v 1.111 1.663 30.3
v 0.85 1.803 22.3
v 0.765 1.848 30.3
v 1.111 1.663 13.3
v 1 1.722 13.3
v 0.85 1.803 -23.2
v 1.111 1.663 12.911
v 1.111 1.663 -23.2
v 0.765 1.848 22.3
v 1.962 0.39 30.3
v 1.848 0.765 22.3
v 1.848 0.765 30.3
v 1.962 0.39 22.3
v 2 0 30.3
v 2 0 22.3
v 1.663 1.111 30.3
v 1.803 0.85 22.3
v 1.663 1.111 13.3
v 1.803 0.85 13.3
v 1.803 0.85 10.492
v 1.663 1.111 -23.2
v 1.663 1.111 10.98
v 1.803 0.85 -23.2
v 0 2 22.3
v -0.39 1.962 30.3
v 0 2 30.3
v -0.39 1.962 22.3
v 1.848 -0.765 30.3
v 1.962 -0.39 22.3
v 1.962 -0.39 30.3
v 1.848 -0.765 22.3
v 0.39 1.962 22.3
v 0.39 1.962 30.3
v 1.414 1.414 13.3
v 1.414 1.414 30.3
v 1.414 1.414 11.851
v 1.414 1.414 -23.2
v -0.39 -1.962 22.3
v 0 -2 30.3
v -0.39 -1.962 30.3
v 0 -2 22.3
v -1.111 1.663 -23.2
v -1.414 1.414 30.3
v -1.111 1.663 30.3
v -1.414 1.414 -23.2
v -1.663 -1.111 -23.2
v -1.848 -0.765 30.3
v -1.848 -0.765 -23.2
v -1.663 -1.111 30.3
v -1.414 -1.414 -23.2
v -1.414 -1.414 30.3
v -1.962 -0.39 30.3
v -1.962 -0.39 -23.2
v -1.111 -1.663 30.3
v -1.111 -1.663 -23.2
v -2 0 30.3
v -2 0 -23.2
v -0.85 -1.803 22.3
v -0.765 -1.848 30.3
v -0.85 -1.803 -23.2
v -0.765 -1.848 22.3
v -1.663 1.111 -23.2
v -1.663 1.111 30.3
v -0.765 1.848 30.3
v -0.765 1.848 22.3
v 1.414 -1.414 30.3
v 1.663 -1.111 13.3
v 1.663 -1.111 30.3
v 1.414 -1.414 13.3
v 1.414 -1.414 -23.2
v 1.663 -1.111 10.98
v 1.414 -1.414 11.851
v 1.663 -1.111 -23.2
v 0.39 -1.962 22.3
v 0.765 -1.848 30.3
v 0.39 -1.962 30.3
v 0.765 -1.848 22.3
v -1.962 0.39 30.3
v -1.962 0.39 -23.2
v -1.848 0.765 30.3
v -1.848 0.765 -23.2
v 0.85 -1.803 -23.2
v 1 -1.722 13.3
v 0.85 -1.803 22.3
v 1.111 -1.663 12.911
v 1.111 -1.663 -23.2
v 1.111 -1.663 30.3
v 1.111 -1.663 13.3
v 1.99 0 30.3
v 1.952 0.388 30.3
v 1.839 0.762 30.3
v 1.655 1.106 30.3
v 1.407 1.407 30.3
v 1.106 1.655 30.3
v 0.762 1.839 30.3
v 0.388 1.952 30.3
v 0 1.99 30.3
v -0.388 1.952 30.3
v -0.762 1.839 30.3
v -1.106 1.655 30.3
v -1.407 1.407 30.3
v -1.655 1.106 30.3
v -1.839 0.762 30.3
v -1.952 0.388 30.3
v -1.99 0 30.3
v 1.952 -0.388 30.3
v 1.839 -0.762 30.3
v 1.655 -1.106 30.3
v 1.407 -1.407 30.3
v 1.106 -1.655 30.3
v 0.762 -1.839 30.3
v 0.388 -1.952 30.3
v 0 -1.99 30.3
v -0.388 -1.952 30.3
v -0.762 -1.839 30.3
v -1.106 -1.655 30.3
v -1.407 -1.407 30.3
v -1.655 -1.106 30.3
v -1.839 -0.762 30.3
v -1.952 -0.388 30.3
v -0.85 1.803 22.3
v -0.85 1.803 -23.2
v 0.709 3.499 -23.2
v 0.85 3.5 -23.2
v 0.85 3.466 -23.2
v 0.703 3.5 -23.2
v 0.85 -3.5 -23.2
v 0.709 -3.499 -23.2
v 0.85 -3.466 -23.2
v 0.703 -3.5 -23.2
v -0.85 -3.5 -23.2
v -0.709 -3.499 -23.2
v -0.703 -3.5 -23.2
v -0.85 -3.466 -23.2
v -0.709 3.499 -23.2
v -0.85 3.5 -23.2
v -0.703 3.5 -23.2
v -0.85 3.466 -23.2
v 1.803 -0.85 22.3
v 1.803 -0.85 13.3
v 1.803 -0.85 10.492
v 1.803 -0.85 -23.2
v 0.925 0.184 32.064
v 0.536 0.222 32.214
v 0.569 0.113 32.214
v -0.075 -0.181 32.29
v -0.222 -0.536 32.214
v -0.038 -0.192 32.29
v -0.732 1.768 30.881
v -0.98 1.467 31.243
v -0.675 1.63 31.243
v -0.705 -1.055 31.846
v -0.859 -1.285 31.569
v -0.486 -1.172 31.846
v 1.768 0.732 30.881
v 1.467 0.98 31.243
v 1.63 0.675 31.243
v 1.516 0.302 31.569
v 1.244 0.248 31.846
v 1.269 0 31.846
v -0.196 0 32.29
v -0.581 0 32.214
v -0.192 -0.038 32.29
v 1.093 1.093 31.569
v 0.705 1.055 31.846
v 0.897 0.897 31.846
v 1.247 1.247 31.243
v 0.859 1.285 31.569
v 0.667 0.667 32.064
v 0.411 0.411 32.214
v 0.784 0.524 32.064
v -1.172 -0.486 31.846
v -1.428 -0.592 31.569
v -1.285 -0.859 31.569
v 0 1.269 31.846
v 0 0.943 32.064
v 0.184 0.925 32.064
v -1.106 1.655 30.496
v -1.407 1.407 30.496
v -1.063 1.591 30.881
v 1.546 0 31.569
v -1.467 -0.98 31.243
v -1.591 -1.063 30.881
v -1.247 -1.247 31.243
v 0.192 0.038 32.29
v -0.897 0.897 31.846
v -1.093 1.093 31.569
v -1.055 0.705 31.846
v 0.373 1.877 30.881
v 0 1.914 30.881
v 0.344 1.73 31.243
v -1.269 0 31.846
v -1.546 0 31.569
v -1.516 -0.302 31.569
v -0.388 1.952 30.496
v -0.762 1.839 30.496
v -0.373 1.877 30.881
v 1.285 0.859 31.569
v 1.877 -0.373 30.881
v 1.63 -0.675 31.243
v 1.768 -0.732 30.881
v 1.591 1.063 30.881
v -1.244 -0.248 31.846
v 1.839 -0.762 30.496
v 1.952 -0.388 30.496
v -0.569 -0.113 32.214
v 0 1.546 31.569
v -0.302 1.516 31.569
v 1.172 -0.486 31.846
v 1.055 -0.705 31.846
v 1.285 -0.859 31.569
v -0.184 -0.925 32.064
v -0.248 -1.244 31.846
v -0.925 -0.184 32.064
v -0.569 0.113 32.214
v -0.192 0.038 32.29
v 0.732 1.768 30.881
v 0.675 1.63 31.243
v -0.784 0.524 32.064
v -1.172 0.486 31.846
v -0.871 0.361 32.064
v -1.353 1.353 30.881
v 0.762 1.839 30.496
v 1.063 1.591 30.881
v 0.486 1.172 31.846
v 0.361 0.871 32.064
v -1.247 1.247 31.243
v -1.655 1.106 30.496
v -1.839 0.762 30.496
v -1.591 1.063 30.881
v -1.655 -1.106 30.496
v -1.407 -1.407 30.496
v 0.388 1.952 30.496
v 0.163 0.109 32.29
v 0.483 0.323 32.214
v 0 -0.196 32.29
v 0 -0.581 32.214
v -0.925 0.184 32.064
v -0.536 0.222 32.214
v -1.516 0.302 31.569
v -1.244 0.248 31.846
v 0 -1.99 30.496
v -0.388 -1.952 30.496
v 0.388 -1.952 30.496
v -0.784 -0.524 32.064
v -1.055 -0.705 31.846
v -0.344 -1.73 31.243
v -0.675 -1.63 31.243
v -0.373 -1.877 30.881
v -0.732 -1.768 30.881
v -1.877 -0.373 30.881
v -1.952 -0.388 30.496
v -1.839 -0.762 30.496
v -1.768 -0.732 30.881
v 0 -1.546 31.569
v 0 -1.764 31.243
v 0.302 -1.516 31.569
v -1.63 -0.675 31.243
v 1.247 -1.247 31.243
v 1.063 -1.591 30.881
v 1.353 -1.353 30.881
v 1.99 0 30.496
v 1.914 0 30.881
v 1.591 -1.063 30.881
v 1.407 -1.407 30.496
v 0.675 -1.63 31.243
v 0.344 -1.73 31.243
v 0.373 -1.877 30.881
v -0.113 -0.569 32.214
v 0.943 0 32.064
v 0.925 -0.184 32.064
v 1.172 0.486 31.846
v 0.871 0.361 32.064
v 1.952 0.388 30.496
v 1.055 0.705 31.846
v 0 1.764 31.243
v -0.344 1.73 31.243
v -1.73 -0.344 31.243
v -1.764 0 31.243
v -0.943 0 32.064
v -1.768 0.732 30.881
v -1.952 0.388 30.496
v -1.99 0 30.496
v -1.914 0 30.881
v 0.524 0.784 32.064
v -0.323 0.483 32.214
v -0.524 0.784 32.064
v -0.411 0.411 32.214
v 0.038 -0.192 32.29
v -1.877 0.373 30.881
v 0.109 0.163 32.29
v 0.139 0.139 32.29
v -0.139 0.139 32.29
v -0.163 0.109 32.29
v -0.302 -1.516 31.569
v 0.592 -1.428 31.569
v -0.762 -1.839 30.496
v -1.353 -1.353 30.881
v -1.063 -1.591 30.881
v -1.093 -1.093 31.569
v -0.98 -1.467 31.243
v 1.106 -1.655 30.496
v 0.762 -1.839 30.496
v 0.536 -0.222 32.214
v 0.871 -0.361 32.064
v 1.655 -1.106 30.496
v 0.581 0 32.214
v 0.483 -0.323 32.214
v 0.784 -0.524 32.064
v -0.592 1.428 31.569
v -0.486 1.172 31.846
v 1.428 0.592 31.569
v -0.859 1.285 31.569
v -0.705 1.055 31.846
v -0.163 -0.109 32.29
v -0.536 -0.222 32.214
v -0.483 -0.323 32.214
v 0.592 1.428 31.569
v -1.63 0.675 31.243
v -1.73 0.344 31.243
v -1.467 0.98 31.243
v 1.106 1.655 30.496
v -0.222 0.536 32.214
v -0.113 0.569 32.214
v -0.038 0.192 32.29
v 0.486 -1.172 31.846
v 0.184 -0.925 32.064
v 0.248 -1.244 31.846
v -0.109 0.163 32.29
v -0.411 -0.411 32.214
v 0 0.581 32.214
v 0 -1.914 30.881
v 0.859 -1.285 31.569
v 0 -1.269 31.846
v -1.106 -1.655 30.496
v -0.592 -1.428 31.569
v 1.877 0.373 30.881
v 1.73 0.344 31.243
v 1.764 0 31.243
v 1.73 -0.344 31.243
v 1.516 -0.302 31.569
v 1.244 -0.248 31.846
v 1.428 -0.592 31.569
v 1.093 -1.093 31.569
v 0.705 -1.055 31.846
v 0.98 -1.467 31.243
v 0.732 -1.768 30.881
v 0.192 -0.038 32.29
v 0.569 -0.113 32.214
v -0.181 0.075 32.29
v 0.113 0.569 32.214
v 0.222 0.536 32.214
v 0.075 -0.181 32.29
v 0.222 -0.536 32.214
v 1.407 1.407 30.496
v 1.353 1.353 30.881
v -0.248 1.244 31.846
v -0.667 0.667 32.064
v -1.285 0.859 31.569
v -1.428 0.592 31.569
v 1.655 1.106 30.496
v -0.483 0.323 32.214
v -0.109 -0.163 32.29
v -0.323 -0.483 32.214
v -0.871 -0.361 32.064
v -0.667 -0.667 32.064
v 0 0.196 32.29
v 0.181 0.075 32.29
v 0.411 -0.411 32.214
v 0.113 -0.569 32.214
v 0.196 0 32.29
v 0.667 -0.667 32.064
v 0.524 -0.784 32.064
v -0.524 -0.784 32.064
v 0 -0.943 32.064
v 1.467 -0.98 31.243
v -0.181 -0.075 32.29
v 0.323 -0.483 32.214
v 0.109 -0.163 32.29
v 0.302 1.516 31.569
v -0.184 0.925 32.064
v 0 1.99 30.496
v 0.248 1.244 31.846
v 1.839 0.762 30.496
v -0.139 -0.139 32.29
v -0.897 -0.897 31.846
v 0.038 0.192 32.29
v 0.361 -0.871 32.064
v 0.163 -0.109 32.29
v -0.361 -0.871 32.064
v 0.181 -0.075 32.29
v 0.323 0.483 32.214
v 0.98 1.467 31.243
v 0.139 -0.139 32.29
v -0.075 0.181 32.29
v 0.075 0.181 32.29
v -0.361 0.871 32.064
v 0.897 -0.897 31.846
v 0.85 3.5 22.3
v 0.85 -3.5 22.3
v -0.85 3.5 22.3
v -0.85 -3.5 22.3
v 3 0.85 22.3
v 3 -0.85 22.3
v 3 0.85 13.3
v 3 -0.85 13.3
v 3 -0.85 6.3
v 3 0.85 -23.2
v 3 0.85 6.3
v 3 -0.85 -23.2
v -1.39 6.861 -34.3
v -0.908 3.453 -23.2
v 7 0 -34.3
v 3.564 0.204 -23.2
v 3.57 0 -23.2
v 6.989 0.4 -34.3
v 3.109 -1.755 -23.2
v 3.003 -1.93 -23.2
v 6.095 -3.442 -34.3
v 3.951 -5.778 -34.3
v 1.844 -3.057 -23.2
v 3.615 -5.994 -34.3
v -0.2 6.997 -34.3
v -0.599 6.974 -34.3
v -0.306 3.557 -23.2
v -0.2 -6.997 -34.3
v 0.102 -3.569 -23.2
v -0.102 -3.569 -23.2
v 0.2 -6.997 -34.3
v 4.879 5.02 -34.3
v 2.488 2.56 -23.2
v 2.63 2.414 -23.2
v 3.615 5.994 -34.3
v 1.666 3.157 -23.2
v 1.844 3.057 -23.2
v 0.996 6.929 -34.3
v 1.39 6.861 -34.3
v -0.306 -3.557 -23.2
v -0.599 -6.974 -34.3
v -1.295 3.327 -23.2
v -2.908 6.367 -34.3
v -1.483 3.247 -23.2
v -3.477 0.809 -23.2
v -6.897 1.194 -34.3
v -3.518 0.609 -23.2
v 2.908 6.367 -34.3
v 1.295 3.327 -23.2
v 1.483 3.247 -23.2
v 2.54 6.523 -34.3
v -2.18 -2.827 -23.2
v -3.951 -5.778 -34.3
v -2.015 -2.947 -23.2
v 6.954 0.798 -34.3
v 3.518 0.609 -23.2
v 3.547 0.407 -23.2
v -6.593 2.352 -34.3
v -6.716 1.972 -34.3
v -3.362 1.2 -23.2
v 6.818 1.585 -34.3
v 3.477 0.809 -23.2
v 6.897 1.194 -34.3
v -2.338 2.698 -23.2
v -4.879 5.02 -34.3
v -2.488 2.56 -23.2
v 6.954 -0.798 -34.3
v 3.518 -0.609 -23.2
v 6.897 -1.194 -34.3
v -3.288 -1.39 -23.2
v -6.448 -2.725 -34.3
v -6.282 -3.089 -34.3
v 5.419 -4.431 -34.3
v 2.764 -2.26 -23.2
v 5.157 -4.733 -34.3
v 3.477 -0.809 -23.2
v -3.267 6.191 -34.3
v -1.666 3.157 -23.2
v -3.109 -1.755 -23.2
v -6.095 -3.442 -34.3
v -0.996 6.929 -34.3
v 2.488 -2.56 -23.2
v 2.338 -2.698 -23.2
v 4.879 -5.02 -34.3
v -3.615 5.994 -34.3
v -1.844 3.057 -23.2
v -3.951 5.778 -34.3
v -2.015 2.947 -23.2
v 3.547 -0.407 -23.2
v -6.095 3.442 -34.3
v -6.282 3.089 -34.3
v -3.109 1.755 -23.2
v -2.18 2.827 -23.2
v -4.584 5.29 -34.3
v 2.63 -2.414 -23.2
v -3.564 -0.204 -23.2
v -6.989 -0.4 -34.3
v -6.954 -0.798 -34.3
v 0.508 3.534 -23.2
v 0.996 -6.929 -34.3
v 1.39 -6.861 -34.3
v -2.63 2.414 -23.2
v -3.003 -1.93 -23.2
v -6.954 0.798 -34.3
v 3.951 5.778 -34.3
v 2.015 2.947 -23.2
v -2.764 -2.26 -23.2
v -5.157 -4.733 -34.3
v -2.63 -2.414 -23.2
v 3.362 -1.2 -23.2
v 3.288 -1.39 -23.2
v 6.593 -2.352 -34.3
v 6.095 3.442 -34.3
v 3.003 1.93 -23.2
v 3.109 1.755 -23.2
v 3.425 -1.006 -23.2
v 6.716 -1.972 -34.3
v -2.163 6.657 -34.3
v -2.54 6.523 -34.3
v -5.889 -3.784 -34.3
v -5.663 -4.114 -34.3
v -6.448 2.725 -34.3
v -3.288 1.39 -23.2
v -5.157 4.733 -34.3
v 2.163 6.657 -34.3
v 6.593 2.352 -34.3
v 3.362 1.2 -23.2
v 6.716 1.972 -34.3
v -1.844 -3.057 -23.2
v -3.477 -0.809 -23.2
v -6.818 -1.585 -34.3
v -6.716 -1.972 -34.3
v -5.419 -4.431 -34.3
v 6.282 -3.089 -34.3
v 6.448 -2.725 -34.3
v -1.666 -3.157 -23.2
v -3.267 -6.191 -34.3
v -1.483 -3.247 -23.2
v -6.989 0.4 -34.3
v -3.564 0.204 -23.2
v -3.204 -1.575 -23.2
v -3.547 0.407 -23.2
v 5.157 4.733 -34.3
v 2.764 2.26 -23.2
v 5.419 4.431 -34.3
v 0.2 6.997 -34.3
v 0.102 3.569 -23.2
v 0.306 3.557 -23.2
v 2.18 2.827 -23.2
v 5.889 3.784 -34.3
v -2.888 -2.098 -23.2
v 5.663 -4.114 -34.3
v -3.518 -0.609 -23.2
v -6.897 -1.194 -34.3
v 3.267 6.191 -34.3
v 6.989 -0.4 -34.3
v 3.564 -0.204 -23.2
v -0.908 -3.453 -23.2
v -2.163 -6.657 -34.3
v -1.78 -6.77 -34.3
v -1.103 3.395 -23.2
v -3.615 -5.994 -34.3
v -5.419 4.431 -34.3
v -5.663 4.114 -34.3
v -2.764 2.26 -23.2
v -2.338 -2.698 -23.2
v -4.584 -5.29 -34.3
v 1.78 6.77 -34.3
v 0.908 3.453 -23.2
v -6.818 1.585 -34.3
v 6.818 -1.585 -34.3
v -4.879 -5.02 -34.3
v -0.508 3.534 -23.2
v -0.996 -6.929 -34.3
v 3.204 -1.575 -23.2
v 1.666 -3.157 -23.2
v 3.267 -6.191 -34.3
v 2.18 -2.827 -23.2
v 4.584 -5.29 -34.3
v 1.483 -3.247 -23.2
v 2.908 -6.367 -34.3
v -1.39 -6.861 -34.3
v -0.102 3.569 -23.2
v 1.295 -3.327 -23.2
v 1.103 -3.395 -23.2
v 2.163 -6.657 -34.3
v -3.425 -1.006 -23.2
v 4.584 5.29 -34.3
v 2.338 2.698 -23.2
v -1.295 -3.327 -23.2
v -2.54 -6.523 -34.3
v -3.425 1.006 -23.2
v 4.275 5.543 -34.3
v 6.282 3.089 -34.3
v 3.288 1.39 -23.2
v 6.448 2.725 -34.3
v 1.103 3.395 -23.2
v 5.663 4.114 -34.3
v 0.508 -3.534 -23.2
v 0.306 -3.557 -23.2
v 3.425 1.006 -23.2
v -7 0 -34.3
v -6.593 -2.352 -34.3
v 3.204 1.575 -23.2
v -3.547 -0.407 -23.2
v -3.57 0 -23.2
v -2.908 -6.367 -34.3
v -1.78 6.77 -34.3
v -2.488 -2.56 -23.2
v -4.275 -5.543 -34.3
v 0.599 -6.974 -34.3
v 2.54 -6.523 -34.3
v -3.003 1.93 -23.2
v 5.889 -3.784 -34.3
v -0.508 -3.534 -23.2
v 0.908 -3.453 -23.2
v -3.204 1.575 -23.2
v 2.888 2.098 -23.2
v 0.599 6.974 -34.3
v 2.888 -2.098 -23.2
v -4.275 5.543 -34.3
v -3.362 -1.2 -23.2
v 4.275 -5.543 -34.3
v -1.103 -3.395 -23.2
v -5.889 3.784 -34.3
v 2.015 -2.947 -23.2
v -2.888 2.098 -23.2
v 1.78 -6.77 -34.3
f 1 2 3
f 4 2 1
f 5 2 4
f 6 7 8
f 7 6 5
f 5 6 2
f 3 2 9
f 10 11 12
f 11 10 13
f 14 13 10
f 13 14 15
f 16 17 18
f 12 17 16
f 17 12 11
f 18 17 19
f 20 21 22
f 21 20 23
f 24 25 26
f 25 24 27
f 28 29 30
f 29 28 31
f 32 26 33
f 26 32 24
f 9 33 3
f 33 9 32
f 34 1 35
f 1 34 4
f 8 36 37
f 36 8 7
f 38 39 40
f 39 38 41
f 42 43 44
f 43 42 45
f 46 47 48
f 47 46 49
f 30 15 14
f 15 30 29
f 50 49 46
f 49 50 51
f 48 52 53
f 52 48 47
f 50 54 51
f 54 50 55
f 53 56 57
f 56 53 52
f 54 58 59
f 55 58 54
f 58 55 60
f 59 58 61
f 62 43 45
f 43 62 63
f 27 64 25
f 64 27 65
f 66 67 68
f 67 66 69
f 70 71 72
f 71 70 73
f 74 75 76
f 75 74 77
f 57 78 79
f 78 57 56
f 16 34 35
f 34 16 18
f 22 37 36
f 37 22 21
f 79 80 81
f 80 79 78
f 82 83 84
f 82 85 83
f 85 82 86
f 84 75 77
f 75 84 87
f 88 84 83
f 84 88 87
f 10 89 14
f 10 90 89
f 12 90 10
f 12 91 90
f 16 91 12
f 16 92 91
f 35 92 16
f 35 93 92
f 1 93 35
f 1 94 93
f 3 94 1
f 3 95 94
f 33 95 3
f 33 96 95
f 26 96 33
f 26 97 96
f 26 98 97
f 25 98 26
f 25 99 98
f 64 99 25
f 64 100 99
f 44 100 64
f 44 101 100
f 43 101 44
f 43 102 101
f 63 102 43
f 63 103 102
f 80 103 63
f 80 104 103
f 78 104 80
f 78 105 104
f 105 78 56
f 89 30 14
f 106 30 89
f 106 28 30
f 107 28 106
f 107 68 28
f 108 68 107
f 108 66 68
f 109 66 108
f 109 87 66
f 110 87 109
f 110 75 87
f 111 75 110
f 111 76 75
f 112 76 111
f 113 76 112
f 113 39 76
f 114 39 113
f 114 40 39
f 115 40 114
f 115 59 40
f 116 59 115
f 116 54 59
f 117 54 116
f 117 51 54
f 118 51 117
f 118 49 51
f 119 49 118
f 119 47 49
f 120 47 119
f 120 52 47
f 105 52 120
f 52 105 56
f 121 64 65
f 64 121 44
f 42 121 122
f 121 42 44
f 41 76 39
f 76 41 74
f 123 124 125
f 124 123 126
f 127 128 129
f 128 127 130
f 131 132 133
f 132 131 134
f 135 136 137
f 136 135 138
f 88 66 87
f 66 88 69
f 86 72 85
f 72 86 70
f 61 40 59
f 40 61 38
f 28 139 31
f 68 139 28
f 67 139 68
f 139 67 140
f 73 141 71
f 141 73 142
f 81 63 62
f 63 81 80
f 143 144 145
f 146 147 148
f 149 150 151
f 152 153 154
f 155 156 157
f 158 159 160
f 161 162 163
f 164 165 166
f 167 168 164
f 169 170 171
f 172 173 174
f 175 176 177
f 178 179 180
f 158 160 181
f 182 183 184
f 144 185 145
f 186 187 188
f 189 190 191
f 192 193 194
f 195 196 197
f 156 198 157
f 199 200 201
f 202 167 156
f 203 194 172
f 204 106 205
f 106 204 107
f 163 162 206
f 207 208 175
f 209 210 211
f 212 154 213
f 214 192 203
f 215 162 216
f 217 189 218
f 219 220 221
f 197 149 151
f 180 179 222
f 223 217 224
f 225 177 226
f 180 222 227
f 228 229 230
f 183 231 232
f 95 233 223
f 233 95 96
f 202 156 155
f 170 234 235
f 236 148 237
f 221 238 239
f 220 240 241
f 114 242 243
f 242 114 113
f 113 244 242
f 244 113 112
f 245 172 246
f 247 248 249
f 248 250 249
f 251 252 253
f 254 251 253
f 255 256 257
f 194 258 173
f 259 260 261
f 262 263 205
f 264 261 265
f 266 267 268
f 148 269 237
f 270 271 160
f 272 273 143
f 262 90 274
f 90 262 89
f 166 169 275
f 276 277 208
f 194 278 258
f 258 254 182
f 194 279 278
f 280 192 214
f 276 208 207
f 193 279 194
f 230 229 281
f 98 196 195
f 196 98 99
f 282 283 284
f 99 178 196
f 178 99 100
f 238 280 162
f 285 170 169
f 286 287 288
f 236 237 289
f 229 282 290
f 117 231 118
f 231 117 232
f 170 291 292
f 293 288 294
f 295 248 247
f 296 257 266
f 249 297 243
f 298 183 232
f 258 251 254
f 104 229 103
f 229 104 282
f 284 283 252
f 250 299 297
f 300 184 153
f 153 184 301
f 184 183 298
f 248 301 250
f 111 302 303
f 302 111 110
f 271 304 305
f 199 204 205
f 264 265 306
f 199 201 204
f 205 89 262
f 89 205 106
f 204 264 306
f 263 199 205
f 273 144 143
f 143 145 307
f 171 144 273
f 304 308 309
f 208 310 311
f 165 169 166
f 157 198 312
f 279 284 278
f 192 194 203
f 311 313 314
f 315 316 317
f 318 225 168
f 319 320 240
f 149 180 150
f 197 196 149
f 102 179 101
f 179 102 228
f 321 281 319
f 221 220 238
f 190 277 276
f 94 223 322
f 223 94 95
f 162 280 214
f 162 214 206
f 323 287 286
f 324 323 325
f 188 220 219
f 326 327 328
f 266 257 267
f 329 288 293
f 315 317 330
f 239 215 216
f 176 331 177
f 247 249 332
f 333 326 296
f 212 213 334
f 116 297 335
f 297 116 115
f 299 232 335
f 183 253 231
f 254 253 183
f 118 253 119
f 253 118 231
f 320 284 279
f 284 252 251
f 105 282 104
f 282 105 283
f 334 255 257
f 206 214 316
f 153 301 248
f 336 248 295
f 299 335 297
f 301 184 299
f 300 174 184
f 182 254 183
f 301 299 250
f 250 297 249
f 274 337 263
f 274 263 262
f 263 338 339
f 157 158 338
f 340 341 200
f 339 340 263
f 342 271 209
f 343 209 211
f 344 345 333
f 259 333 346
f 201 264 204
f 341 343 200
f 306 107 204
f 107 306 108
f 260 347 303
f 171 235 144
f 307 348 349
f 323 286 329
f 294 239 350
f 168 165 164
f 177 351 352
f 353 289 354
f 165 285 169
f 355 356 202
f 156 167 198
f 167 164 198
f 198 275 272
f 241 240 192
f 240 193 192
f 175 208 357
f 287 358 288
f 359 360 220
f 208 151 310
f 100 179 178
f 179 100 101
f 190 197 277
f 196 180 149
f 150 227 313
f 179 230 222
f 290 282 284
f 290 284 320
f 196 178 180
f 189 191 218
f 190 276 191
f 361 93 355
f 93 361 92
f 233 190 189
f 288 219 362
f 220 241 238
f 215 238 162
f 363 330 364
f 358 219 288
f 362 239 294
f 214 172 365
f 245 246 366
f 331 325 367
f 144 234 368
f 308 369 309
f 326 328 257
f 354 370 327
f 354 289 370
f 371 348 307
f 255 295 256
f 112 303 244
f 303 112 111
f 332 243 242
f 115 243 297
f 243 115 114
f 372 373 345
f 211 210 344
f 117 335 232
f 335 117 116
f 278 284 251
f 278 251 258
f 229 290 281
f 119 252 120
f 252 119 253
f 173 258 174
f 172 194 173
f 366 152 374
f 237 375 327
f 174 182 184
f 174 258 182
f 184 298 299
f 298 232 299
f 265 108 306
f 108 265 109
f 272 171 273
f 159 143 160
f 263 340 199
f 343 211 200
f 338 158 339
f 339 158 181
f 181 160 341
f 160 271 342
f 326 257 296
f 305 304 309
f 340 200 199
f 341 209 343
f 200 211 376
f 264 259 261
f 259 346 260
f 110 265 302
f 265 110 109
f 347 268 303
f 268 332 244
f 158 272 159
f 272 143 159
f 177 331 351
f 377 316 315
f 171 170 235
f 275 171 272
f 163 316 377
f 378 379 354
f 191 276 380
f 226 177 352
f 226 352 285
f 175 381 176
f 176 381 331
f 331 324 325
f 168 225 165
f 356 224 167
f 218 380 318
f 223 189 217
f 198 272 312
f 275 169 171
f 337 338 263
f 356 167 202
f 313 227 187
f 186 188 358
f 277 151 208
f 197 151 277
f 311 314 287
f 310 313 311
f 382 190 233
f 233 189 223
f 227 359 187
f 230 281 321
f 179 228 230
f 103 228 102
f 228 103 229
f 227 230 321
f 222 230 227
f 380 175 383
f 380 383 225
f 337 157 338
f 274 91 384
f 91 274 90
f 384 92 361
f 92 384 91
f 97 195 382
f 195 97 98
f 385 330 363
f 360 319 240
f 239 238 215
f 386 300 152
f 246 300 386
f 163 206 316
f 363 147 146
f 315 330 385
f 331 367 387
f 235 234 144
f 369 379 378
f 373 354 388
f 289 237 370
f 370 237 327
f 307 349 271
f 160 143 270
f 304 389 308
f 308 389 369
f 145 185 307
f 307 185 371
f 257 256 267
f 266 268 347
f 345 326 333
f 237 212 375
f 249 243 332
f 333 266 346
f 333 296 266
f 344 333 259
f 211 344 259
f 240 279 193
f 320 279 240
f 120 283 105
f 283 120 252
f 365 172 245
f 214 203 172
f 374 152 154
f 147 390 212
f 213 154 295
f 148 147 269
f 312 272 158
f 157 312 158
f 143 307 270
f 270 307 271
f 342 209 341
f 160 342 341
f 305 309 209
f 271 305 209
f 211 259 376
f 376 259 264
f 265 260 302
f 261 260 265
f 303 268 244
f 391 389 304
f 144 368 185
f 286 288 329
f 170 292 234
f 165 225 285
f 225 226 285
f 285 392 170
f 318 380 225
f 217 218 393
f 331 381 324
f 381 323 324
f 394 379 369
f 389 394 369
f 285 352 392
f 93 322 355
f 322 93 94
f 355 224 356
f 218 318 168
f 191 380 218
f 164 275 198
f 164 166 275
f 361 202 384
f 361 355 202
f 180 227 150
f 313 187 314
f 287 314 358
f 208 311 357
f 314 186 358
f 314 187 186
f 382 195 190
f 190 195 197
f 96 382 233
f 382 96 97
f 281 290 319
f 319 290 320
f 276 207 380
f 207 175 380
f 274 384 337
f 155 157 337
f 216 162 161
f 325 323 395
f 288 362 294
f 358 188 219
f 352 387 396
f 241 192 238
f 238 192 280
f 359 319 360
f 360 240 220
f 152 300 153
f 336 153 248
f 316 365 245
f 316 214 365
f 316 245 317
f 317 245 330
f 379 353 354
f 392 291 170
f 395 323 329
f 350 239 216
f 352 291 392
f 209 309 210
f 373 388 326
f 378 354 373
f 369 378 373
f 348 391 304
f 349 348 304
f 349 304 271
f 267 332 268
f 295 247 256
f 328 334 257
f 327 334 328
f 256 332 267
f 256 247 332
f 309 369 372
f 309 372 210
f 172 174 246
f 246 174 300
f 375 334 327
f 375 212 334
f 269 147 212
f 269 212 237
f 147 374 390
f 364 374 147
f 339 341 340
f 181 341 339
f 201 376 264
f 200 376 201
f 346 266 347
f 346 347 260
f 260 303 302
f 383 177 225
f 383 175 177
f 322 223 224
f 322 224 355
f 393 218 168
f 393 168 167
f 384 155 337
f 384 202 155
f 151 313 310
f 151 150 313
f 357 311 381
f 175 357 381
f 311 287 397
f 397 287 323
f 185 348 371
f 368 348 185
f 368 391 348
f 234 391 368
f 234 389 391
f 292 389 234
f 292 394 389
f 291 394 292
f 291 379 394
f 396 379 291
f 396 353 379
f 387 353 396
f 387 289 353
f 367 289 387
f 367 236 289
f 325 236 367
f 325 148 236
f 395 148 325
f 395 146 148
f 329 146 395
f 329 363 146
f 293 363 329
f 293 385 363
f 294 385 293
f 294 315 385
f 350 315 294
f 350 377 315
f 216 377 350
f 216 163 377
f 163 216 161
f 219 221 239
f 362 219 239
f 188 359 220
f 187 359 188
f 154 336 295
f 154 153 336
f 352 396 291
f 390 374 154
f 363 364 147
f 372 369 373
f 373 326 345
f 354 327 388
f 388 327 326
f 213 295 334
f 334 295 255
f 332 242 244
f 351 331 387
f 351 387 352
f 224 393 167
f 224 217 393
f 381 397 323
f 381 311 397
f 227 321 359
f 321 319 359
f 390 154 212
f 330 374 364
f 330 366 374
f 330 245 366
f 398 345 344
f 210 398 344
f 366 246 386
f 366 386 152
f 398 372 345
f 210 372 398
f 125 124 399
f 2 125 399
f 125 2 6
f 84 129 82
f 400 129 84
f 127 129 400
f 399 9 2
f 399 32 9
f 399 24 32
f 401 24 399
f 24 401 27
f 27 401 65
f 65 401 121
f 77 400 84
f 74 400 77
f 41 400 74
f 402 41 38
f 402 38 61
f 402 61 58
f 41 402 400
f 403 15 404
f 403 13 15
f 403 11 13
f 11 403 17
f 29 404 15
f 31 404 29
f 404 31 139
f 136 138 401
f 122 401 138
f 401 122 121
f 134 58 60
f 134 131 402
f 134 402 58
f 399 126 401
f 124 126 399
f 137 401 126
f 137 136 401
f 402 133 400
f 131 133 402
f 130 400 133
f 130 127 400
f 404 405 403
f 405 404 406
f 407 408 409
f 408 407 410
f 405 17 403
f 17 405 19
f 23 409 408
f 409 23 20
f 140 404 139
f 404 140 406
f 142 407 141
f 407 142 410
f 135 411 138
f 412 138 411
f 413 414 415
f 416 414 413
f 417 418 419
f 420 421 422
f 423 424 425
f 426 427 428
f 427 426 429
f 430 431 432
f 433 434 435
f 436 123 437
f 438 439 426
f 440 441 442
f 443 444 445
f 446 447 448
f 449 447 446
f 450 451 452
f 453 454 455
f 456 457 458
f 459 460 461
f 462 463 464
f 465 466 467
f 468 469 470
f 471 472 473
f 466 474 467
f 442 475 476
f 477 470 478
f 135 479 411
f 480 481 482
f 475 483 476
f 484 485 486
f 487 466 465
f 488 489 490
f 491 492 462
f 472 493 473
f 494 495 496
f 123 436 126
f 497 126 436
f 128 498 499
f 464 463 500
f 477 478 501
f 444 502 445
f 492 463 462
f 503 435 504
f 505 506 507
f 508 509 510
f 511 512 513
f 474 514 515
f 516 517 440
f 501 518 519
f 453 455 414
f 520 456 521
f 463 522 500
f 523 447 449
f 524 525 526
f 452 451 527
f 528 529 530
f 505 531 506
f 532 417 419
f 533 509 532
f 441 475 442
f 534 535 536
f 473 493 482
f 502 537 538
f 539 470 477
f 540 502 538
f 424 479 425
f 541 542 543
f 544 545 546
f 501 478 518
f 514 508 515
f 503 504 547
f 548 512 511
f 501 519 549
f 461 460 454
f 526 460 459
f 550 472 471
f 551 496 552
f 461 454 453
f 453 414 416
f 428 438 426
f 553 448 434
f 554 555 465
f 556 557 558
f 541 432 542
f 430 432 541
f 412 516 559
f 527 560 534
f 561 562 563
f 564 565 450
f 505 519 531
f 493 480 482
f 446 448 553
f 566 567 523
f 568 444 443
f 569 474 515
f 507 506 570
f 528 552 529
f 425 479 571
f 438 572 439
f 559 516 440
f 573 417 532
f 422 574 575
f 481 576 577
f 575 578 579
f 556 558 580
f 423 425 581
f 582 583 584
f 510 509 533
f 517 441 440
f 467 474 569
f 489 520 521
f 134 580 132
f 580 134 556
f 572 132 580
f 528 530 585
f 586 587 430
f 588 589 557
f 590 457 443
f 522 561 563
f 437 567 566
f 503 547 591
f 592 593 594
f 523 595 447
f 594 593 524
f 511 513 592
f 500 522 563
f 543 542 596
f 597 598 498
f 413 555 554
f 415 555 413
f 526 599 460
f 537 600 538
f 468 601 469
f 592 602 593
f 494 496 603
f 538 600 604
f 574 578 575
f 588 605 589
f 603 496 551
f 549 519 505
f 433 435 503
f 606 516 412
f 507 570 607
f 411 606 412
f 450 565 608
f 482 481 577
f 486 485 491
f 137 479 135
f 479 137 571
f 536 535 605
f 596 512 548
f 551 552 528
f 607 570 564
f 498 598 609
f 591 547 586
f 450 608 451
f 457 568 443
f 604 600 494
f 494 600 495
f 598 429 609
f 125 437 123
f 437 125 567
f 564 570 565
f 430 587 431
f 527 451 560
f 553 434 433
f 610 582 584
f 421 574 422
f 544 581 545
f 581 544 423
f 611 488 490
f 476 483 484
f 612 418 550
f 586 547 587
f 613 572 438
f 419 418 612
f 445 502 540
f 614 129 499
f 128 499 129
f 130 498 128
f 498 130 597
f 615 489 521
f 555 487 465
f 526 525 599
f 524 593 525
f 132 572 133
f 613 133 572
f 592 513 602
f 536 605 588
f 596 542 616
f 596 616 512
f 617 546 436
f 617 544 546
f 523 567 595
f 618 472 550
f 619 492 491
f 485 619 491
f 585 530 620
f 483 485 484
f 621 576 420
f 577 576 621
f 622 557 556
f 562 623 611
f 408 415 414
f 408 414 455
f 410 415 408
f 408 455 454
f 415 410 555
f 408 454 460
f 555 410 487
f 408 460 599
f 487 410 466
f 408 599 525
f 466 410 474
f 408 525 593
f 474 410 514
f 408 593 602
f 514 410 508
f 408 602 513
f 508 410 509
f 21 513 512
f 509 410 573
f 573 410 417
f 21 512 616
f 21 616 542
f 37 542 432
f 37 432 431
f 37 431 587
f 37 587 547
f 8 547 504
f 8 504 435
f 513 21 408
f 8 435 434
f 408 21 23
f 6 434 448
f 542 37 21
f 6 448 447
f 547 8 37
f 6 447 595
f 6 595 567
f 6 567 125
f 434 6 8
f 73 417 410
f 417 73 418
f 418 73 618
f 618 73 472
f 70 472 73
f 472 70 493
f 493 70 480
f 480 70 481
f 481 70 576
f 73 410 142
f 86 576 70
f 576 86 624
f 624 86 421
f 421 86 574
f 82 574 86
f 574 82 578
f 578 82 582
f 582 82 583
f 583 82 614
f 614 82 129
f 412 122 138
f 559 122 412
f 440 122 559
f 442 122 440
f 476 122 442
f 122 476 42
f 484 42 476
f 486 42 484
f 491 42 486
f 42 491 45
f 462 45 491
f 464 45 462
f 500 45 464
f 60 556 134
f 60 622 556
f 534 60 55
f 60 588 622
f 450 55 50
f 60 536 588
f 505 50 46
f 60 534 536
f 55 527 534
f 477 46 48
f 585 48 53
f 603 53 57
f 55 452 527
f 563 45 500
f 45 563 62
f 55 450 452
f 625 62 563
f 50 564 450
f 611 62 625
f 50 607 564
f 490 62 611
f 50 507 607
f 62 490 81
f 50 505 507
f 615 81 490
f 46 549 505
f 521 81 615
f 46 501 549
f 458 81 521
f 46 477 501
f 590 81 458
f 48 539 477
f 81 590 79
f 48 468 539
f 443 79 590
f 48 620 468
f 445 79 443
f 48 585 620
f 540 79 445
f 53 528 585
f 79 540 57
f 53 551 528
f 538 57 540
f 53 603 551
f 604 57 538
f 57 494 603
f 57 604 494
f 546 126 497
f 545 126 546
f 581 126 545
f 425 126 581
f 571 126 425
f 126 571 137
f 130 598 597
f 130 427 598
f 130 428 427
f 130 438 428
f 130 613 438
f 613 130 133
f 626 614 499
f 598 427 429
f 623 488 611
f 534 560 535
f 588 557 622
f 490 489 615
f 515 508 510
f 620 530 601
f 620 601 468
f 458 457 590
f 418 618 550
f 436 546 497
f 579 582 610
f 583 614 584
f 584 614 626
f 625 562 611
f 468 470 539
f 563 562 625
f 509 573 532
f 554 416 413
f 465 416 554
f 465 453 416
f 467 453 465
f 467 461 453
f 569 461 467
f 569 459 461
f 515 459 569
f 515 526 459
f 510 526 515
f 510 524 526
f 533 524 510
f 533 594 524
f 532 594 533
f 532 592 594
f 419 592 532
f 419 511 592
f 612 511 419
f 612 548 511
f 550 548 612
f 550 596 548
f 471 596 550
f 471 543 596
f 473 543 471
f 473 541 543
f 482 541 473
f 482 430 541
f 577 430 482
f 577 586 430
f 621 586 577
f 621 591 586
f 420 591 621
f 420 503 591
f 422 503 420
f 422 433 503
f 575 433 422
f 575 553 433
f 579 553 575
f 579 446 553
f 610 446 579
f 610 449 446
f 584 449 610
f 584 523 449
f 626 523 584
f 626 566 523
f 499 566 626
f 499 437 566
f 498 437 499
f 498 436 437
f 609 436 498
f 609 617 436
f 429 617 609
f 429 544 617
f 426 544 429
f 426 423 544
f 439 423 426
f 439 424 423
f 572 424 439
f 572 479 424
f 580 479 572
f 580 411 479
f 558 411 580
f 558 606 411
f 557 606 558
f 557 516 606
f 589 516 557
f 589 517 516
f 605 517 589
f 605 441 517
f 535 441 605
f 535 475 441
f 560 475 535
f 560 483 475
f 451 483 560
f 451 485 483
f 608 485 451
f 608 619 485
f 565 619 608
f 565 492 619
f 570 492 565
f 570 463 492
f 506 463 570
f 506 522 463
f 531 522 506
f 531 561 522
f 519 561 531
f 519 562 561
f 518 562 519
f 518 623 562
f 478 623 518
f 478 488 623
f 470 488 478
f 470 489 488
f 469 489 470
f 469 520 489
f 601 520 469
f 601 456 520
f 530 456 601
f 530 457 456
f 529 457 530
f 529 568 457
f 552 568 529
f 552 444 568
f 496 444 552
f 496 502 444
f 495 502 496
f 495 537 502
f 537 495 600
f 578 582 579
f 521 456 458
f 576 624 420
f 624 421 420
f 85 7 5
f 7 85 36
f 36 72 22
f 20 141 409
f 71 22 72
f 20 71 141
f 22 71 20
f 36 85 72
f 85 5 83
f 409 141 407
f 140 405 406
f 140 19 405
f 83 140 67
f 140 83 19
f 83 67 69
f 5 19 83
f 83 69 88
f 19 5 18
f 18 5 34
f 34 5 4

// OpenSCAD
$fa = 1;
$fs = 0.4;


module batman_arrow(main_rod_length = 55.5, main_rod_diameter = 4, slit_top_distance = 14) {
    // Calculated variables
    main_rod_radius = main_rod_diameter / 2;
    track_offset_from_top = main_rod_length * 0.144144144;
    track_depth = main_rod_diameter * 0.425; // 1.72
    track_width = main_rod_diameter * 1.75; // 7
    track_height = main_rod_length - main_rod_radius - track_offset_from_top;

    top_track_width = (main_rod_diameter / 2) + 1;

    cone_height = main_rod_length * 0.2;
    cone_r1 = track_width;
    cone_r2 = cone_r1 * 0.51;
    
    // Adjust to center point
    translate([0,0,+(cone_height/2)-main_rod_radius])
    difference() {
        union() {
            // Main Rod with rounded tops
            cylinder(h=main_rod_length - main_rod_radius, r1=main_rod_radius, r2=main_rod_radius, center=true);
            translate([0,0, (main_rod_length - main_rod_radius) / 2])
                sphere(r=main_rod_radius);
            
            // Dual "slide track"
            translate([0,0,-(track_offset_from_top / 2)])
                cube([track_depth, track_width, track_height], center=true);
            
            // Top "slide track"
            translate([top_track_width / 2, 0,-(track_offset_from_top / 2)])
                cube([top_track_width, track_depth, track_height], center=true);
            
            // Bottom cone
            translate([0,0, -((main_rod_length - main_rod_radius) / 2) - (cone_height/2) + 0.0001])
                cylinder(h=cone_height, r1=cone_r1, r2=cone_r2, center=true);
        }
        translate([3 + 0.0001 ,0,((main_rod_length - main_rod_radius) / 2) - slit_top_distance]) {
            rotate([270,0,180]) {
                linear_extrude(height = track_width, center = true)
                    polygon([[0,0],[2,0],[0,7]], paths=[[0,1,2]]);
            }
        }
    }
    
}

batman_arrow(main_rod_length = 55.5, main_rod_diameter = 4, slit_top_distance = 17);
